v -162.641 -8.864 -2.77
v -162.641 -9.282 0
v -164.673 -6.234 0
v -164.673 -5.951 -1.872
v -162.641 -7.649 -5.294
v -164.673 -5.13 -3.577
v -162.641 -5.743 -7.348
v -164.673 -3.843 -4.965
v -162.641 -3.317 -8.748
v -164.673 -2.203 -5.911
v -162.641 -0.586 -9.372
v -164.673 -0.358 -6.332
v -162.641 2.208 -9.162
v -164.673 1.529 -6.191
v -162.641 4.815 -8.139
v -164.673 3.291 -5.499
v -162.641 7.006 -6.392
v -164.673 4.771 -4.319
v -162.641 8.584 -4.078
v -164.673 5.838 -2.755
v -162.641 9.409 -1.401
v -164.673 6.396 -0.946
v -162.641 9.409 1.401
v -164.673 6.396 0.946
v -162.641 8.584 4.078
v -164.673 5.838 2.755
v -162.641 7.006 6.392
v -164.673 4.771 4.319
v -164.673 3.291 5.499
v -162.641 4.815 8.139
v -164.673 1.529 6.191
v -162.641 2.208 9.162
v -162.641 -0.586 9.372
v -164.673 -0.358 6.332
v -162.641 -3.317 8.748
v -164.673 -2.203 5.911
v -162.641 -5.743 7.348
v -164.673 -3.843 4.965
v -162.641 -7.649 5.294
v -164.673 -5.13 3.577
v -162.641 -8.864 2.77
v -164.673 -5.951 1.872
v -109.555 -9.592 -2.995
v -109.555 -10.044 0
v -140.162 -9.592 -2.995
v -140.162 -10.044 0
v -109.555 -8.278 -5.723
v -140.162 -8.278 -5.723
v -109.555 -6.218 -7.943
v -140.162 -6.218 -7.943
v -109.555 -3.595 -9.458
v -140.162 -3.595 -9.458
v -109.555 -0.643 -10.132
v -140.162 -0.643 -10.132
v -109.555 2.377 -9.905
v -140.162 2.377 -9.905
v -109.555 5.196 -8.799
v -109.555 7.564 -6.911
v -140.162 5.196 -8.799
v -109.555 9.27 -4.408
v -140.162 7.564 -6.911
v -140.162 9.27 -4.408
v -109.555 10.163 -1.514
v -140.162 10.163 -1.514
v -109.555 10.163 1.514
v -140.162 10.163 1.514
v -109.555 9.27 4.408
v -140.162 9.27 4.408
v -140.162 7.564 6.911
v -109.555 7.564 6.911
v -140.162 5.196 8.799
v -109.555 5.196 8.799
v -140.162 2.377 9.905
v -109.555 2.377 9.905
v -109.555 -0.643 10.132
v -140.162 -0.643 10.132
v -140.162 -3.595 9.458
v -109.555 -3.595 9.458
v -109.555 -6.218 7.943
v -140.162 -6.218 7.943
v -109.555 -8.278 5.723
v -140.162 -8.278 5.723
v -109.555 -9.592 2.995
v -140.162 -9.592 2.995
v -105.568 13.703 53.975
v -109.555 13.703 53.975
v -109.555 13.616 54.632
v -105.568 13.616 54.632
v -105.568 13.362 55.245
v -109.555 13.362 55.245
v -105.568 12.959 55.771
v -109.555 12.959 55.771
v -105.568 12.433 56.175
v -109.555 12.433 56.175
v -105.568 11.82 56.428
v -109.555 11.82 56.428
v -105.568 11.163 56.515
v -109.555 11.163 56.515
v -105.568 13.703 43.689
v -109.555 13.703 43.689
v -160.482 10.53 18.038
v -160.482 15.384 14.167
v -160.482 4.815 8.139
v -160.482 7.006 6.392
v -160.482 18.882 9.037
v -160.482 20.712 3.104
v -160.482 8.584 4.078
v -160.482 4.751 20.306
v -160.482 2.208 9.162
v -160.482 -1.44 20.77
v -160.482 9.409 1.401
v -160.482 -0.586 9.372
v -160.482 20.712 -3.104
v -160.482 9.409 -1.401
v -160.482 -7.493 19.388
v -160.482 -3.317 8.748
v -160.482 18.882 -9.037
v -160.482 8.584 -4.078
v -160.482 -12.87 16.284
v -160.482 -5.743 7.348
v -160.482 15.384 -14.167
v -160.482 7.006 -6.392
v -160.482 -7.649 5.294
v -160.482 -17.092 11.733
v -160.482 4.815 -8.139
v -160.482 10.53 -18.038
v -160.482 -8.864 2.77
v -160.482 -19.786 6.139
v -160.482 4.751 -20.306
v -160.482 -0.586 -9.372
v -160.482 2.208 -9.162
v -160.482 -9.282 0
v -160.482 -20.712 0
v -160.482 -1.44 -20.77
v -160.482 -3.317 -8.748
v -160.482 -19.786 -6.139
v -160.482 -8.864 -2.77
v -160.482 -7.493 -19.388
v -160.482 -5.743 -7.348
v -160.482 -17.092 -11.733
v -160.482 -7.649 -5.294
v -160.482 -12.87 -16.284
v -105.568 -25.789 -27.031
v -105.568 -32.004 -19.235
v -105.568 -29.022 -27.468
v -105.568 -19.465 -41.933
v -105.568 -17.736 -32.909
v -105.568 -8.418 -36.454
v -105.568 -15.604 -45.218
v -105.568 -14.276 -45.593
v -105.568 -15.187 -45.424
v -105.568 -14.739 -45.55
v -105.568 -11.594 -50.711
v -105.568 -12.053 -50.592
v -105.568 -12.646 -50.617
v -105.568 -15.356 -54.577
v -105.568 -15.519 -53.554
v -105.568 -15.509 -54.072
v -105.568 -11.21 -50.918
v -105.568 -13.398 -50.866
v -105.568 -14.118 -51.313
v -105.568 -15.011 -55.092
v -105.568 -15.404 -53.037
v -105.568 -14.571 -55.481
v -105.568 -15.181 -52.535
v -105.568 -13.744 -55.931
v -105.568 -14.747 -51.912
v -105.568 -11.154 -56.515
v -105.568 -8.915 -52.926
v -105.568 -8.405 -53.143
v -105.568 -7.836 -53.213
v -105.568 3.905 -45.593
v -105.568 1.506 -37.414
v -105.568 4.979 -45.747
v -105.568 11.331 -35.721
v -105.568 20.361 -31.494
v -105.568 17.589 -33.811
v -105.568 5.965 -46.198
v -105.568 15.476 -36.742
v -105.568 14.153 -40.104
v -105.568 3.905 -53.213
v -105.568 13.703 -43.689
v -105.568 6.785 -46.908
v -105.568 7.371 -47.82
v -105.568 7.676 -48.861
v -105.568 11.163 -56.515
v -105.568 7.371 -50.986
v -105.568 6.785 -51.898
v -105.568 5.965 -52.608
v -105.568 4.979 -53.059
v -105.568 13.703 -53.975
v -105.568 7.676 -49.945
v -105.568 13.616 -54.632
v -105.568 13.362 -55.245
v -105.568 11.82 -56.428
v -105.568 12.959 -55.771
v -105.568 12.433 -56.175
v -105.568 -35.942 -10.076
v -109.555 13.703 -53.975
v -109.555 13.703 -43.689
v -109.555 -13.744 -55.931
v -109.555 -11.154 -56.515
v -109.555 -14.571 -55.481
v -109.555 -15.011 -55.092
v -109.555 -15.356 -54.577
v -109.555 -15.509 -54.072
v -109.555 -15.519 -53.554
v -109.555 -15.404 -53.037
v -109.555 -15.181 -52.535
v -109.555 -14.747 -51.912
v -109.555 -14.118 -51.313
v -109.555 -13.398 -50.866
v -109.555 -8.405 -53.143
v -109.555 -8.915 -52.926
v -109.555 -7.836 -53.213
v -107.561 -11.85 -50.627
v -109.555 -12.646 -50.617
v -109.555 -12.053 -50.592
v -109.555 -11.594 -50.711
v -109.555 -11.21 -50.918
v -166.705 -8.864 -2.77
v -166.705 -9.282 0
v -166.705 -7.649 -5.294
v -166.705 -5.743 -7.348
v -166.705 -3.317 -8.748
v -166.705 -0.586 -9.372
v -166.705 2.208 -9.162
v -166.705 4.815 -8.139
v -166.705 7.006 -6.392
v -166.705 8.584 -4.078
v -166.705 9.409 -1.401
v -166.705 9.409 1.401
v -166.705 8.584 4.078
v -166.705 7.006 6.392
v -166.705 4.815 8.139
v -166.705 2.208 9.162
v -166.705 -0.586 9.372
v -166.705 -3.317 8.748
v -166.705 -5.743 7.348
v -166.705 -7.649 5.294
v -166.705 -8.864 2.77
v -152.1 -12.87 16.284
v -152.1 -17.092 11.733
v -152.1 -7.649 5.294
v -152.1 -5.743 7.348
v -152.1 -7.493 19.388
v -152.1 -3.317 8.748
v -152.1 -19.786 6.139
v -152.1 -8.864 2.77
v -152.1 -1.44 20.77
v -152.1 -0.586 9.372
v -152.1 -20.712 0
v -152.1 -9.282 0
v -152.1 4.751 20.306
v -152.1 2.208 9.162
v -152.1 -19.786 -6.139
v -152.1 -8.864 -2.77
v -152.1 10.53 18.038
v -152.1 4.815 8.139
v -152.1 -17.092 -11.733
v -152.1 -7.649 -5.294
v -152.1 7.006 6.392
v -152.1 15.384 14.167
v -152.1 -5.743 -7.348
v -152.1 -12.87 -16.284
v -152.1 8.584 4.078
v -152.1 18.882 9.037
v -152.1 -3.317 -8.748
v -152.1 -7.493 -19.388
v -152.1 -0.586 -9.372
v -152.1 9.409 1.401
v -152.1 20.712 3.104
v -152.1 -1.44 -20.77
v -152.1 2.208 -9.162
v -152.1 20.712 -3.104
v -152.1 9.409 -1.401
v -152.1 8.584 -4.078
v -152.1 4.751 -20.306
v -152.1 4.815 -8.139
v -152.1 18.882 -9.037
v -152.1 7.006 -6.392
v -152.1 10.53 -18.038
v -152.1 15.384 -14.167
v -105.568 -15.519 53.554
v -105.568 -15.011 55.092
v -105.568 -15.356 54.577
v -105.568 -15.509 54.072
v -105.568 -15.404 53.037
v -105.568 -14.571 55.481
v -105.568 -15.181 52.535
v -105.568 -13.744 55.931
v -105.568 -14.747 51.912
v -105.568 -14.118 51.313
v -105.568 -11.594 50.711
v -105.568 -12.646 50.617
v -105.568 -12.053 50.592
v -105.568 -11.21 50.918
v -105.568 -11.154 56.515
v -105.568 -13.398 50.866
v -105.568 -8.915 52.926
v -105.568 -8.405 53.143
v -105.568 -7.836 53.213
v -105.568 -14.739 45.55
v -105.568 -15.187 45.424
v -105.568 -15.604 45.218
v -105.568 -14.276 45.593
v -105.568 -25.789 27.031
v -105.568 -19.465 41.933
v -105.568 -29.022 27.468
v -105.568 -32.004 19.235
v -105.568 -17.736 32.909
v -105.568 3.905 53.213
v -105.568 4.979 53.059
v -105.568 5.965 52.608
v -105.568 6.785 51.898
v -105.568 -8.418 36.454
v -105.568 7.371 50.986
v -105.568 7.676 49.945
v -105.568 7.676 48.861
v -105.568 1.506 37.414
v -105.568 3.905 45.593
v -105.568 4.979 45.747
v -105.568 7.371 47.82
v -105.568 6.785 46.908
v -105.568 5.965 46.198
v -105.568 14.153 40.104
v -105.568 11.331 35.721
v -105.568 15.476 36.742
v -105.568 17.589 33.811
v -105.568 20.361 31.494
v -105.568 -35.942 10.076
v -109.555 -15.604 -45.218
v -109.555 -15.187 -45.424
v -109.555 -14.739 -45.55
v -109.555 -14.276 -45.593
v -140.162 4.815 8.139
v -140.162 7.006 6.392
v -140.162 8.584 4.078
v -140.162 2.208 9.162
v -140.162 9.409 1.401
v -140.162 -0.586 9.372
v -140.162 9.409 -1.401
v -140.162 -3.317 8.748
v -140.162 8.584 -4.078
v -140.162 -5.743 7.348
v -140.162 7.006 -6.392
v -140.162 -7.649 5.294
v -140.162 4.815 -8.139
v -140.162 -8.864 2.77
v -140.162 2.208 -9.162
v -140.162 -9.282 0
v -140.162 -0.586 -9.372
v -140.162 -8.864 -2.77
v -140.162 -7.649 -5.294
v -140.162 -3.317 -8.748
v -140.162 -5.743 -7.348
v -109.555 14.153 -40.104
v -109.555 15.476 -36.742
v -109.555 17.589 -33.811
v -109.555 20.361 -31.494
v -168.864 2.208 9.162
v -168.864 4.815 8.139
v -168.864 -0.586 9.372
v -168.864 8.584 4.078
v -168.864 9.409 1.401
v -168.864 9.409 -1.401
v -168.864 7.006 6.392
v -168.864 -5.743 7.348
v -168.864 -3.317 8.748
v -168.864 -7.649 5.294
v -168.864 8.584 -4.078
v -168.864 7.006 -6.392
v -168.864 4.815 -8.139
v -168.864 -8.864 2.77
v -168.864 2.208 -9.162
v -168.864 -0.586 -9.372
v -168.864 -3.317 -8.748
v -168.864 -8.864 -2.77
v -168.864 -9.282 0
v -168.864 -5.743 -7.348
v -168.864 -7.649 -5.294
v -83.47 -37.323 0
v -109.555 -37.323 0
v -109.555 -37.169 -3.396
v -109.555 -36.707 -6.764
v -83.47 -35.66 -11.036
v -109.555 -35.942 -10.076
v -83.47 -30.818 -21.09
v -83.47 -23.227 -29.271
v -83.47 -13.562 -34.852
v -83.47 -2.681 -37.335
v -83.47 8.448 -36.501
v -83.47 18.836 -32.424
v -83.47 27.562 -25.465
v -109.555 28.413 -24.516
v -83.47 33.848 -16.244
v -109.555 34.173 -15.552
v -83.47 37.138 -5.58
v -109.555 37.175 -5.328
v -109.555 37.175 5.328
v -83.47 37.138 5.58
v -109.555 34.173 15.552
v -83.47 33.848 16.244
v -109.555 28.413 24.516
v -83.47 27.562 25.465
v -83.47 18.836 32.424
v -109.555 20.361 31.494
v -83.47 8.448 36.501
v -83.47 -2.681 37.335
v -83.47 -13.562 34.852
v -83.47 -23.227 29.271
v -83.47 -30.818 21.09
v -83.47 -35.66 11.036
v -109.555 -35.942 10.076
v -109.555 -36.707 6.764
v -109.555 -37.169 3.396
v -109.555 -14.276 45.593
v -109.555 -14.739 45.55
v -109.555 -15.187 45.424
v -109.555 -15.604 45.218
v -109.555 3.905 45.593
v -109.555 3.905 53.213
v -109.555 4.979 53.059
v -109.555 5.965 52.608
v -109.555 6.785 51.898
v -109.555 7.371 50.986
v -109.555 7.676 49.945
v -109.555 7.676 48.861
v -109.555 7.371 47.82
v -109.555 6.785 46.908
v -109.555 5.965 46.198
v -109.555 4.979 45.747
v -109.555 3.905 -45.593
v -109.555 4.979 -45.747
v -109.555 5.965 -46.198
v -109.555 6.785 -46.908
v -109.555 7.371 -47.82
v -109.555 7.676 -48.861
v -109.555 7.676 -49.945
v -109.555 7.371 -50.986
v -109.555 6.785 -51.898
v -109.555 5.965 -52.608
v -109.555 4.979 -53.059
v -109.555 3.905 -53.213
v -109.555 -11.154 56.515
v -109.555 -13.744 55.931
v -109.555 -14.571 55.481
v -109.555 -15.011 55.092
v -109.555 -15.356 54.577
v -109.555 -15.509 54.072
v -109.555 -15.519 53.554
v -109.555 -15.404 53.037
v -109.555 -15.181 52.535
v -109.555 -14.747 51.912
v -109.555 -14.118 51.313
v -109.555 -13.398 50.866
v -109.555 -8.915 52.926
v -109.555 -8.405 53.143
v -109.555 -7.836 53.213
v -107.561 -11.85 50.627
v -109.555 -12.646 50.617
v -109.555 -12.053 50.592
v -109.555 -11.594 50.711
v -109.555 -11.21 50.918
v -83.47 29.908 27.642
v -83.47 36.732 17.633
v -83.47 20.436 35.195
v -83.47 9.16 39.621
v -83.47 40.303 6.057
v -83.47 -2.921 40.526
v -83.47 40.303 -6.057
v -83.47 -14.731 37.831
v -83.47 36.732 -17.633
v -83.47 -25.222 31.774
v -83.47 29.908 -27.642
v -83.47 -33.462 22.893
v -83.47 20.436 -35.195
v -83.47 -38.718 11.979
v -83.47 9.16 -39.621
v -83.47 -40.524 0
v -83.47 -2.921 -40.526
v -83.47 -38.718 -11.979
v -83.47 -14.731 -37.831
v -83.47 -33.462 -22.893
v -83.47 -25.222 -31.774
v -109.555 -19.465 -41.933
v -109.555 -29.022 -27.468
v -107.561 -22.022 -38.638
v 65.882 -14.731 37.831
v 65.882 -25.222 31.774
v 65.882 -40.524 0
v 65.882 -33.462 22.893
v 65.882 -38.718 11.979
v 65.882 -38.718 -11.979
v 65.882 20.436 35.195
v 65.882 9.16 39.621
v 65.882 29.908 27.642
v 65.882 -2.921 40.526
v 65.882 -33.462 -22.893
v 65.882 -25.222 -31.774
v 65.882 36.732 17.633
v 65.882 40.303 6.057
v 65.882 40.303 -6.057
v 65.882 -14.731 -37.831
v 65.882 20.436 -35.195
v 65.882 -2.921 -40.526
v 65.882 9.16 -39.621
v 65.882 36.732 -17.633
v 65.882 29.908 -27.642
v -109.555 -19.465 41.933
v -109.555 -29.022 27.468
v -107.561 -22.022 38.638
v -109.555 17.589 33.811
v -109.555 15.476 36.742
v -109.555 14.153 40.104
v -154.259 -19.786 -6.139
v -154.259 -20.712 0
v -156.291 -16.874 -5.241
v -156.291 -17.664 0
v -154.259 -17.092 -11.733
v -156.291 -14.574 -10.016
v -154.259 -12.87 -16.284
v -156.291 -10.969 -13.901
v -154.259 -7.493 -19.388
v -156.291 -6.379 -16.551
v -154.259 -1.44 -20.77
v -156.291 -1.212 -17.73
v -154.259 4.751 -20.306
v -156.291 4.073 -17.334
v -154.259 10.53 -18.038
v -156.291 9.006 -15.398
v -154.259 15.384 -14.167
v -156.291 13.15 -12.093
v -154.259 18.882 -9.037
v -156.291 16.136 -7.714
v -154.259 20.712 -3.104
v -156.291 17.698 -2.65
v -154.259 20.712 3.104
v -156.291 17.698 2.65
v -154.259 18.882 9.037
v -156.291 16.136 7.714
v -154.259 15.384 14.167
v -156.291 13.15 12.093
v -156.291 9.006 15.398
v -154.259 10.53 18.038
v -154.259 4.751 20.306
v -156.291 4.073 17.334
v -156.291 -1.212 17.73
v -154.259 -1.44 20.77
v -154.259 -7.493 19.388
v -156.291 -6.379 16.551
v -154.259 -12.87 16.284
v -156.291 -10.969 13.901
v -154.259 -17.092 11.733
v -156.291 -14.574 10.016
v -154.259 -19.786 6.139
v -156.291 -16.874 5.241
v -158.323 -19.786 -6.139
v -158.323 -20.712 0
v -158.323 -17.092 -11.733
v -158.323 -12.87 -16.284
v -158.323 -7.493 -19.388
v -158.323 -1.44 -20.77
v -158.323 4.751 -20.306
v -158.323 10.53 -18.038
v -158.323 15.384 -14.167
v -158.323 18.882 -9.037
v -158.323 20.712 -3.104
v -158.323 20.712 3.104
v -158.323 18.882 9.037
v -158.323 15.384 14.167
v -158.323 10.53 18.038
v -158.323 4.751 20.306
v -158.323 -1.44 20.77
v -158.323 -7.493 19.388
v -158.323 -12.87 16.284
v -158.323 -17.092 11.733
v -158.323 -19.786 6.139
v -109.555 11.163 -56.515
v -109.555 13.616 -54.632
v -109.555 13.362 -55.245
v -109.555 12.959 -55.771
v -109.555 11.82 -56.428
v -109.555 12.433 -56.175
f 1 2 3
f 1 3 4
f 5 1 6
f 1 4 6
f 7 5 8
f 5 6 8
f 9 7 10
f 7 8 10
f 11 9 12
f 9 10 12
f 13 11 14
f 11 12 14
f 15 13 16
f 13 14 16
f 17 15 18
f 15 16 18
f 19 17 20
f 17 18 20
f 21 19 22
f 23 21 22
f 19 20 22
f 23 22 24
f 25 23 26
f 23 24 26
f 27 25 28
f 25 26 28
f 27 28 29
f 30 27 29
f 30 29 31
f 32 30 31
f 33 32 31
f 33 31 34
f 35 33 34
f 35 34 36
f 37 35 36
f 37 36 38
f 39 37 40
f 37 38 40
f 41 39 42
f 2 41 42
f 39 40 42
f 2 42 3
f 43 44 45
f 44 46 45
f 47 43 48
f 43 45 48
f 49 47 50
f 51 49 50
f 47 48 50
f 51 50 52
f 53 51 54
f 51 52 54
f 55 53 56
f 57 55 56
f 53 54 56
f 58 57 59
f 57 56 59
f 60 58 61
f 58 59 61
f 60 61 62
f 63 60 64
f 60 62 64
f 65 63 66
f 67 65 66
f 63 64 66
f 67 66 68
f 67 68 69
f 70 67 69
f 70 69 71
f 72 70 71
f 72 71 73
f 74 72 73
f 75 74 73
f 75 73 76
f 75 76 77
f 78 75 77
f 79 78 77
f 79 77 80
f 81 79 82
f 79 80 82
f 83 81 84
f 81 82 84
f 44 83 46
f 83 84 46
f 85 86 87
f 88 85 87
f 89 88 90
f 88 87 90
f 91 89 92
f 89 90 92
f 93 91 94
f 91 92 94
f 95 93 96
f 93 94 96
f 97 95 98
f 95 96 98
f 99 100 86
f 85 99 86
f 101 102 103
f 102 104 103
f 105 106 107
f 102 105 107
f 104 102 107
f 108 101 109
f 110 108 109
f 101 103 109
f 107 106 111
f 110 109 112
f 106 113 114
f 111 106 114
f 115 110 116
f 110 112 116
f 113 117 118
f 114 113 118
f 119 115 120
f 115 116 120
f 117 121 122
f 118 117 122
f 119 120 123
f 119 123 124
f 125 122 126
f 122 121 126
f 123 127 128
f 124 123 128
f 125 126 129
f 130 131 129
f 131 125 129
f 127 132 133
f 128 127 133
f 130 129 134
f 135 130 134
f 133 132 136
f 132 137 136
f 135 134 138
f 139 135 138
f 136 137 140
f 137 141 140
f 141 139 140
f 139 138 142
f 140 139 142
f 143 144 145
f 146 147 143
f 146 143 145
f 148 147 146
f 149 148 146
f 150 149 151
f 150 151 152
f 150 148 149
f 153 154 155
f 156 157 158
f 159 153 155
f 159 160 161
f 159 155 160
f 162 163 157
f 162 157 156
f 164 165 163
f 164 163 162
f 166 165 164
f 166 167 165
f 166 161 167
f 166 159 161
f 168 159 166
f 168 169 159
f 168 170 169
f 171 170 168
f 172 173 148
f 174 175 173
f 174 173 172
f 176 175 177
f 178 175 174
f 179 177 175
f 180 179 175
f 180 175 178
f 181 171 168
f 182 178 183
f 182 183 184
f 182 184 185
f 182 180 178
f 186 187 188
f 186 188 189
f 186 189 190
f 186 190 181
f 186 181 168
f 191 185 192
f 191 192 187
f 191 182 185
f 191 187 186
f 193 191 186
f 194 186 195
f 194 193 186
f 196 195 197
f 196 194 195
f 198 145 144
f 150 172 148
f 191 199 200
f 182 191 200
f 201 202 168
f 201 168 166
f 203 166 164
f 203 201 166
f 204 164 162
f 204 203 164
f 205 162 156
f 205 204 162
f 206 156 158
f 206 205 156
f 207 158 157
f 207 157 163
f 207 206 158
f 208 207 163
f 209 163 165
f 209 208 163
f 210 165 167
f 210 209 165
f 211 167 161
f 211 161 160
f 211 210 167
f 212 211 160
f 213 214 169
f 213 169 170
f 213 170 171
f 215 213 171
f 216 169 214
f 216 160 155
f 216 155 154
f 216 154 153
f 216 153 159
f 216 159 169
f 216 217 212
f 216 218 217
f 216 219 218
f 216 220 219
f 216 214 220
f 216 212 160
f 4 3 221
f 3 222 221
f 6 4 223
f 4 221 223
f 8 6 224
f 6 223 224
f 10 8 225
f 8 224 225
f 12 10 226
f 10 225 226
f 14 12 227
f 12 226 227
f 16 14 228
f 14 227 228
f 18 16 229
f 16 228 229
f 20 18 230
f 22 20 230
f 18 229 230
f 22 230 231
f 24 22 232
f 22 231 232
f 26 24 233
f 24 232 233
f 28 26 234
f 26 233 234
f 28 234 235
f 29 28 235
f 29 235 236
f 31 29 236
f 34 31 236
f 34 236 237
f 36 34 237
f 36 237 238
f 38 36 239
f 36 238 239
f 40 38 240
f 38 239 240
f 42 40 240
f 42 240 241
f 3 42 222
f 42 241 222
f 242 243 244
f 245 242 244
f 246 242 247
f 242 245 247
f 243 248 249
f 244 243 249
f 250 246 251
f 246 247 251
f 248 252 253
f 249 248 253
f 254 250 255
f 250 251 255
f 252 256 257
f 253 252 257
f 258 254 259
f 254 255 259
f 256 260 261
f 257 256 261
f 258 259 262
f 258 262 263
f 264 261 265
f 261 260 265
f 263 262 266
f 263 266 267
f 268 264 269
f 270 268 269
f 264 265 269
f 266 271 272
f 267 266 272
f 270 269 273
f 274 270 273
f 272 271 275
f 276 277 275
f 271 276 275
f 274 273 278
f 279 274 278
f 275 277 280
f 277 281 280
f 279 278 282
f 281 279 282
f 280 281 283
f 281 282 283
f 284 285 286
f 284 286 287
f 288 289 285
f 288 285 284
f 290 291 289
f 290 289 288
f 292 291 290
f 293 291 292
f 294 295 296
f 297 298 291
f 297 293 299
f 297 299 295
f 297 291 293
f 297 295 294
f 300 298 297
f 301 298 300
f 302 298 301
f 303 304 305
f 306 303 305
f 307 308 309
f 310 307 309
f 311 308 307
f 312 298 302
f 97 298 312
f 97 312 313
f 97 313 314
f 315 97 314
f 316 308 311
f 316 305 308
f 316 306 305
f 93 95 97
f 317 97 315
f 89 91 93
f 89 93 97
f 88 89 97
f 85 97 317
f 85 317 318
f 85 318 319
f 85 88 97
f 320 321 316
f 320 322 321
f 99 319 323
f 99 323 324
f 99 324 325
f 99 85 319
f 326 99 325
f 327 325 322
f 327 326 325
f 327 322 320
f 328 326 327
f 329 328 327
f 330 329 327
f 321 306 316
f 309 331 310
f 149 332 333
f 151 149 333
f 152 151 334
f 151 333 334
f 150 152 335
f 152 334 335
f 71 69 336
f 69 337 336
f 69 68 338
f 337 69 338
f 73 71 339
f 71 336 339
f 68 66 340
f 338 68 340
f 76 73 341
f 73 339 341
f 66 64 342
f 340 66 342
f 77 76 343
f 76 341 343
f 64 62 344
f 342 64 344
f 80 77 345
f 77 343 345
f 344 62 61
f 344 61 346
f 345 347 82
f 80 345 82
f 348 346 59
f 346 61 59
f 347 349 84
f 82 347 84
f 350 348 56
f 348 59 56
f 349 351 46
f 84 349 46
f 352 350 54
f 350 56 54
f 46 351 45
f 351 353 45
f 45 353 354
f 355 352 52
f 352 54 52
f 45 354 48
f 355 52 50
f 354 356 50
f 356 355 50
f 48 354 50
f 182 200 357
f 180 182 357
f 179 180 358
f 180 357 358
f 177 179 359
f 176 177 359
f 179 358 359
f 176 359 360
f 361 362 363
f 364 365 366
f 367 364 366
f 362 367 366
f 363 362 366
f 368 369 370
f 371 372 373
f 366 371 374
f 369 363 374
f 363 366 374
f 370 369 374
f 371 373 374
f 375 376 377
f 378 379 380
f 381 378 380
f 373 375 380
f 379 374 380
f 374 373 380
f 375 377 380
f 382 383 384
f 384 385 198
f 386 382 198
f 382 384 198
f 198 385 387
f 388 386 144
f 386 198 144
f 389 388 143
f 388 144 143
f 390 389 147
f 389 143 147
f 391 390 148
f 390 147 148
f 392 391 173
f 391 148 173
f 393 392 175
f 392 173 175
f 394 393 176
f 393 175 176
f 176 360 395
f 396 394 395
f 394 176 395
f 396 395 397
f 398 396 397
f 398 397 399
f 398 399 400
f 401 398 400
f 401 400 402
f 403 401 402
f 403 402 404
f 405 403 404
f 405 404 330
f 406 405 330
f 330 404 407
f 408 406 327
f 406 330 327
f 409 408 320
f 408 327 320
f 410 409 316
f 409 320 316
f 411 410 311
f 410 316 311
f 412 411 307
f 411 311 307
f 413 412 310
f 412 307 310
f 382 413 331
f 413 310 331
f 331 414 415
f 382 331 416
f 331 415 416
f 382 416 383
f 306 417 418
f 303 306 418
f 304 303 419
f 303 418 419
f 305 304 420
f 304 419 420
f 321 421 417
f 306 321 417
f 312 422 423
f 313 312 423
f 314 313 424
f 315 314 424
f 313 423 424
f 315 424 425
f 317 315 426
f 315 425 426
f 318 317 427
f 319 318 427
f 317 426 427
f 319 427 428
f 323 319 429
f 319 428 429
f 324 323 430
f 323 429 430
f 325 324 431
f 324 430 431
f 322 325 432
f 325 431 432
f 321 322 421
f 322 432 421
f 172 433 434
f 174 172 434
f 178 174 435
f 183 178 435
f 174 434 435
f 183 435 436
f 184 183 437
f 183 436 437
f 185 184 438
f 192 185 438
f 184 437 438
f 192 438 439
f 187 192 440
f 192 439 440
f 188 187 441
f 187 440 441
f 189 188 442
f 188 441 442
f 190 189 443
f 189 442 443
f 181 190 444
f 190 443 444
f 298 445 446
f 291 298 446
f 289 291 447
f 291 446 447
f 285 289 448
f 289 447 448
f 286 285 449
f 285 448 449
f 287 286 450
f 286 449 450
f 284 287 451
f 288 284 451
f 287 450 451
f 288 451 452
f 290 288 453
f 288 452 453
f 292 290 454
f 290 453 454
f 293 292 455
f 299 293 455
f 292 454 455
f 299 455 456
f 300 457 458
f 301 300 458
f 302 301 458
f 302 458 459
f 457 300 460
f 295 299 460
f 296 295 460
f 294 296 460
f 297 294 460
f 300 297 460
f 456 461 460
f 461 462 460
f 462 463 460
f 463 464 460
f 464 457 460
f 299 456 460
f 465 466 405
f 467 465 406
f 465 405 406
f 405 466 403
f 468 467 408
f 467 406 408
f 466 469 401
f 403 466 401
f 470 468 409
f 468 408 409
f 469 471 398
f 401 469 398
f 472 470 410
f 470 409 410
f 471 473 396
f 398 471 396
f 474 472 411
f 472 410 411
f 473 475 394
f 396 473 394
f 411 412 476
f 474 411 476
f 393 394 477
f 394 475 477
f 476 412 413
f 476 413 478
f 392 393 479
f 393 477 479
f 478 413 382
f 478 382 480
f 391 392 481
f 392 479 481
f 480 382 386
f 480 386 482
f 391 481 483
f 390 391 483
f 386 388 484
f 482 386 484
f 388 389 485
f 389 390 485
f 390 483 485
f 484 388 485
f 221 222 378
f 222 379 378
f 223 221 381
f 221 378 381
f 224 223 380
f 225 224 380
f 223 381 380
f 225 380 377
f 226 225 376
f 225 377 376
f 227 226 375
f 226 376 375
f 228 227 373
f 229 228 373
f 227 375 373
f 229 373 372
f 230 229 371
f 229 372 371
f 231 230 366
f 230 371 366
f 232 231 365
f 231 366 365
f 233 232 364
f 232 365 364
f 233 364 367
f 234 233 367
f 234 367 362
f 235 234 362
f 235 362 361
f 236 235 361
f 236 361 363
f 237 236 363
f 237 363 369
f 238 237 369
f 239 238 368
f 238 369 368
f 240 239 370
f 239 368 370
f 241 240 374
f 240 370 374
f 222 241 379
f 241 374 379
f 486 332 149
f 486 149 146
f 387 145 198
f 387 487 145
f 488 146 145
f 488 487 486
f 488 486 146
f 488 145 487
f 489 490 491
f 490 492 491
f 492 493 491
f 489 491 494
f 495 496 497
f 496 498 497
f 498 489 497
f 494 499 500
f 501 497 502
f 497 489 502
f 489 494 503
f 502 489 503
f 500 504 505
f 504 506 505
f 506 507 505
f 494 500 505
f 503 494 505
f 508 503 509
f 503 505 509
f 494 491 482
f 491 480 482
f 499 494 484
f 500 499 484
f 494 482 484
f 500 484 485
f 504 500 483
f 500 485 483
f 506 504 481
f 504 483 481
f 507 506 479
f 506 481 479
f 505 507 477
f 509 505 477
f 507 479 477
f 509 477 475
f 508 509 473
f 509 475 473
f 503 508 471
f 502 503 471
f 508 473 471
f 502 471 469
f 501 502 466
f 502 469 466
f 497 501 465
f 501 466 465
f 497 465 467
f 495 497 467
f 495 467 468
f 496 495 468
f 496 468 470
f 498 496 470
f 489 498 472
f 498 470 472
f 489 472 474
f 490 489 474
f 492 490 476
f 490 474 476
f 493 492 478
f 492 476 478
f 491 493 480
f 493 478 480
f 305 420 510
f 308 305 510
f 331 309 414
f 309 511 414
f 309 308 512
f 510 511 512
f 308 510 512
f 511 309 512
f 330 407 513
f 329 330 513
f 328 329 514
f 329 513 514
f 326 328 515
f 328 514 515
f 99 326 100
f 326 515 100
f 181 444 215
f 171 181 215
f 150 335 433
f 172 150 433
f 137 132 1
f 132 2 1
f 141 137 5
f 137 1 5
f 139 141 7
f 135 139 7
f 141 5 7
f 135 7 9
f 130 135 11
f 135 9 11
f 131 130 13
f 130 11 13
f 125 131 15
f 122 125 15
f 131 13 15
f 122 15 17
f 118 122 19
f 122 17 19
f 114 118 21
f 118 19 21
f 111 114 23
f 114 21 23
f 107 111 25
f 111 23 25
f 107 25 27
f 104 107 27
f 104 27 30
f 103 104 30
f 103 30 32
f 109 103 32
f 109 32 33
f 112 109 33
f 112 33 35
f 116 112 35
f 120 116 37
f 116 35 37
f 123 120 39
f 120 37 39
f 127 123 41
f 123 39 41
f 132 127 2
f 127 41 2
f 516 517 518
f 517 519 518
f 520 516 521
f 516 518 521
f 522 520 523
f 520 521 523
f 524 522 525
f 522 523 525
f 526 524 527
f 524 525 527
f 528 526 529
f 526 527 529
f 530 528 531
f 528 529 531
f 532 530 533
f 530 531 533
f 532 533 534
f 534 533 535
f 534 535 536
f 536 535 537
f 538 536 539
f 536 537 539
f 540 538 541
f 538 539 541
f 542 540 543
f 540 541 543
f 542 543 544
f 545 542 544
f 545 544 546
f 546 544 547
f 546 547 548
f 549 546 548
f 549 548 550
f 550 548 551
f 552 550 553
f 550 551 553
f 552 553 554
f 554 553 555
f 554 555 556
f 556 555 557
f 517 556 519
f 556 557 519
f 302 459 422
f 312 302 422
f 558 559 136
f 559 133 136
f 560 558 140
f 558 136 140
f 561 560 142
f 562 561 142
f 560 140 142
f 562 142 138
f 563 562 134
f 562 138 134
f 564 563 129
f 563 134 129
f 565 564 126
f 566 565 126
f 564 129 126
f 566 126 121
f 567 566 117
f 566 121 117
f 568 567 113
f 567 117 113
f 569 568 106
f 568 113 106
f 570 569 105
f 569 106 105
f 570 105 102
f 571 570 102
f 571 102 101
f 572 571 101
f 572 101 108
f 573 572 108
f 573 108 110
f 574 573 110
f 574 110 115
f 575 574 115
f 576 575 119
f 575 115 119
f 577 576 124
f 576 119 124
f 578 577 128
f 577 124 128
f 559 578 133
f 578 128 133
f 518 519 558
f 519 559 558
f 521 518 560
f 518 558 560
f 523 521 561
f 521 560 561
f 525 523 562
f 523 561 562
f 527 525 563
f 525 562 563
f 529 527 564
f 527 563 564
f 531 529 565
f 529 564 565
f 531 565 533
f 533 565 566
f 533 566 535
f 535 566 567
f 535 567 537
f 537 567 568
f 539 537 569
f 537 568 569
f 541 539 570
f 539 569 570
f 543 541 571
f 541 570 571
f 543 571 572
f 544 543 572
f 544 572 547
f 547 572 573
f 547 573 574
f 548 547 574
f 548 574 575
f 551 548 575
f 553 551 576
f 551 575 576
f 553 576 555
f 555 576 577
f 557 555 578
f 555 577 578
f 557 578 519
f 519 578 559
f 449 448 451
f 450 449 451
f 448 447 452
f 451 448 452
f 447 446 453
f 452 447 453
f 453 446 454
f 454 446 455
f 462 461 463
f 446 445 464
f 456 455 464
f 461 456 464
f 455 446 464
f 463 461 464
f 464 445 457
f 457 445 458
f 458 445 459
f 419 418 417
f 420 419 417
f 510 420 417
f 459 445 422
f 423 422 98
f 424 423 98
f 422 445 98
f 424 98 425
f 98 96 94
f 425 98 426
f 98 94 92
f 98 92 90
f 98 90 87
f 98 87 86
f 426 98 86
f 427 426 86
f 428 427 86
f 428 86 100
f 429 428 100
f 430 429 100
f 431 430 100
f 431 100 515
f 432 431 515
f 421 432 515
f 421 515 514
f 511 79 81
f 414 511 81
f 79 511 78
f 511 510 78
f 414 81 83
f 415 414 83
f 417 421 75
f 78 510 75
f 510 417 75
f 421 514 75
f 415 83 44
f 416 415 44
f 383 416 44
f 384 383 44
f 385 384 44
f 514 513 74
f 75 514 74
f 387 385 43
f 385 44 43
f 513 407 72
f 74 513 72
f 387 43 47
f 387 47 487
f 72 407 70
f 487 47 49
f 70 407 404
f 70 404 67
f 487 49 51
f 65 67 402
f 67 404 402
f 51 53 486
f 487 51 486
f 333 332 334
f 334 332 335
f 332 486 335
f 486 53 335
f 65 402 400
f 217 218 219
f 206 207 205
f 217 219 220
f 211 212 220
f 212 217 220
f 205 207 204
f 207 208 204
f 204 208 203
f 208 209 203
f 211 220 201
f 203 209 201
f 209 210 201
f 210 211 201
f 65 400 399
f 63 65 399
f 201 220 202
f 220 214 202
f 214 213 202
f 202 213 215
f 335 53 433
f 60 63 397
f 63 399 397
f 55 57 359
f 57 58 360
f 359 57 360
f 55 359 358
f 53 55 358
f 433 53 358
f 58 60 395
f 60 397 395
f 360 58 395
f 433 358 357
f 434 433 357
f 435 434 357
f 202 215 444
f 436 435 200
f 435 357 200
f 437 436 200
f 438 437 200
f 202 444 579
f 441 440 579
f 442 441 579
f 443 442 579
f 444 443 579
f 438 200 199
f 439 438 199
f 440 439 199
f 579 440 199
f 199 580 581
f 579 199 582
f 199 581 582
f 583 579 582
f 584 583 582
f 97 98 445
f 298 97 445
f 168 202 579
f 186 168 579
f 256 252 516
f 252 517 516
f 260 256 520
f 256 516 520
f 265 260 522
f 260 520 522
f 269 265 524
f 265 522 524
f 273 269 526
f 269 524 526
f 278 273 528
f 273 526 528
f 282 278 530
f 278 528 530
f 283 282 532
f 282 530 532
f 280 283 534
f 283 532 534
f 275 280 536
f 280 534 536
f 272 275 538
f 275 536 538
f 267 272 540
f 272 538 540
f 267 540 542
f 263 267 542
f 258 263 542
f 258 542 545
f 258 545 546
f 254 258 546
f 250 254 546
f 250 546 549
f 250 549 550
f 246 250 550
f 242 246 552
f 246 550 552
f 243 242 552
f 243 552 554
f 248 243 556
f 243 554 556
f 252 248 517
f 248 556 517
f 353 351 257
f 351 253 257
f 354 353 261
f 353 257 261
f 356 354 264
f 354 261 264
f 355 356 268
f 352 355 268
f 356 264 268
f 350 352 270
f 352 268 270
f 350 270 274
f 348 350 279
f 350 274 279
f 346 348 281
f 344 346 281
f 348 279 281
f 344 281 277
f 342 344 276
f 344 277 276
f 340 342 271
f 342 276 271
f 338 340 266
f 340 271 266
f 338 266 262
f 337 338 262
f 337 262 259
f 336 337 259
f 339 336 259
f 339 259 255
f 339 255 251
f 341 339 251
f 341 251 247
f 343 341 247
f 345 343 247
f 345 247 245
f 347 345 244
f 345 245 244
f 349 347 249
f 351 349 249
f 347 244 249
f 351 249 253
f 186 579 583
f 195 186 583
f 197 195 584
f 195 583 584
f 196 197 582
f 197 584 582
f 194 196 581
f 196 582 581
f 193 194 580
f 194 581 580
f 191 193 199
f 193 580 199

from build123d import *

# Parameters (mm, degrees)
BOSS_EXTRUDE1_DEPTH = 3.9878


with BuildPart() as part:
    # Sketch1 → Revolve3 (revolve)
    with BuildSketch(Plane.XY, mode=Mode.PRIVATE) as revolve3_sk:
        Polygon((65.88246304, 0.116454427), (65.88246304, 40.756454427), (-83.46953696, 40.756454427), (-83.46953696, 37.556054427), (-109.55533696, 37.556054427), (-109.55533696, 10.276454427), (-140.16233696, 10.276454427), (-140.16233696, 9.514454427), (-152.10033696, 9.514454427), (-152.10033696, 20.944454427), (-154.25933696, 20.944454427), (-156.29133696, 17.896454427), (-158.32333696, 20.944454427), (-160.48233696, 20.944454427), (-160.48233696, 9.514454427), (-162.64133696, 9.514454427), (-164.67333696, 6.466454427), (-166.70533696, 9.514454427), (-168.86433696, 9.514454427), (-168.86433696, 0.116454427), align=None)
    revolve(revolve3_sk.sketch.rotate(Axis((-168.86433696, 0.116454427, 0), (1, 0, 0)), 180), axis=Axis((-168.86433696, 0.116454427, 0), (1, 0, 0)))

    # Sketch3 → Boss-Extrude1 (add)
    with BuildSketch(Plane.ZY.offset(109.55533696)):
        with BuildLine():
            Line((43.68878247, 13.702640012), (53.975, 13.702640012))
            ThreePointArc((53.975, 13.702640012), (55.771051224, 12.958691236), (56.515, 11.162640012))
            Line((56.515, 11.162640012), (56.515, -11.153855692))
            add(Edge.make_bspline(
                [(56.515, -11.153855692), (55.734670507, -18.980740225), (46.838290405, -11.919148259), (53.258412532, -9.584126469), (53.213, -7.836402131)],
                knots=[0, 0, 0, 0, 0.643468678, 1, 1, 1, 1], degree=3))
            Line((53.213, -7.836402131), (53.213, 3.905256993))
            ThreePointArc((53.213, 3.905256993), (49.403, 7.715256993), (45.593, 3.905256993))
            Line((45.593, 3.905256993), (45.593, -14.276208246))
            ThreePointArc((45.593, -14.276208246), (45.497523844, -14.966065604), (45.21827309, -15.604060815))
            add(Edge.make_bspline(
                [(45.21827309, -15.604060815), (43.450296459, -18.48702562), (32.758547283, -26.592162263), (21.785194585, -32.669841259), (10.075949561, -35.941816311)],
                knots=[0.01574085, 0.01574085, 0.01574085, 0.01574085, 0.236596649, 1, 1, 1, 1], degree=3))
            ThreePointArc((10.075949561, -35.941816311), (0, -37.323145573), (-10.075949561, -35.941816311))
            add(Edge.make_bspline(
                [(-45.21827309, -15.604060815), (-43.450296459, -18.48702562), (-32.758547283, -26.592162263), (-21.785194585, -32.669841259), (-10.075949561, -35.941816311)],
                knots=[0.01574085, 0.01574085, 0.01574085, 0.01574085, 0.236596649, 1, 1, 1, 1], degree=3))
            ThreePointArc((-45.21827309, -15.604060815), (-45.497523844, -14.966065604), (-45.593, -14.276208246))
            Line((-45.593, -14.276208246), (-45.593, 3.905256993))
            ThreePointArc((-45.593, 3.905256993), (-49.403, 7.715256993), (-53.213, 3.905256993))
            Line((-53.213, 3.905256993), (-53.213, -7.836402131))
            add(Edge.make_bspline(
                [(-56.515, -11.153855692), (-55.734670507, -18.980740225), (-46.838290405, -11.919148259), (-53.258412532, -9.584126469), (-53.213, -7.836402131)],
                knots=[0, 0, 0, 0, 0.643468678, 1, 1, 1, 1], degree=3))
            Line((-56.515, -11.153855692), (-56.515, 11.162640012))
            ThreePointArc((-56.515, 11.162640012), (-55.771051224, 12.958691236), (-53.975, 13.702640012))
            Line((-53.975, 13.702640012), (-43.68878247, 13.702640012))
            ThreePointArc((-43.68878247, 13.702640012), (-36.742018611, 15.475534924), (-31.494435631, 20.360568941))
            ThreePointArc((-31.494435631, 20.360568941), (0, 37.556054427), (31.494435631, 20.360568941))
            ThreePointArc((31.494435631, 20.360568941), (36.742018611, 15.475534924), (43.68878247, 13.702640012))
        make_face()
    extrude(amount=-BOSS_EXTRUDE1_DEPTH)


solid = part.part
